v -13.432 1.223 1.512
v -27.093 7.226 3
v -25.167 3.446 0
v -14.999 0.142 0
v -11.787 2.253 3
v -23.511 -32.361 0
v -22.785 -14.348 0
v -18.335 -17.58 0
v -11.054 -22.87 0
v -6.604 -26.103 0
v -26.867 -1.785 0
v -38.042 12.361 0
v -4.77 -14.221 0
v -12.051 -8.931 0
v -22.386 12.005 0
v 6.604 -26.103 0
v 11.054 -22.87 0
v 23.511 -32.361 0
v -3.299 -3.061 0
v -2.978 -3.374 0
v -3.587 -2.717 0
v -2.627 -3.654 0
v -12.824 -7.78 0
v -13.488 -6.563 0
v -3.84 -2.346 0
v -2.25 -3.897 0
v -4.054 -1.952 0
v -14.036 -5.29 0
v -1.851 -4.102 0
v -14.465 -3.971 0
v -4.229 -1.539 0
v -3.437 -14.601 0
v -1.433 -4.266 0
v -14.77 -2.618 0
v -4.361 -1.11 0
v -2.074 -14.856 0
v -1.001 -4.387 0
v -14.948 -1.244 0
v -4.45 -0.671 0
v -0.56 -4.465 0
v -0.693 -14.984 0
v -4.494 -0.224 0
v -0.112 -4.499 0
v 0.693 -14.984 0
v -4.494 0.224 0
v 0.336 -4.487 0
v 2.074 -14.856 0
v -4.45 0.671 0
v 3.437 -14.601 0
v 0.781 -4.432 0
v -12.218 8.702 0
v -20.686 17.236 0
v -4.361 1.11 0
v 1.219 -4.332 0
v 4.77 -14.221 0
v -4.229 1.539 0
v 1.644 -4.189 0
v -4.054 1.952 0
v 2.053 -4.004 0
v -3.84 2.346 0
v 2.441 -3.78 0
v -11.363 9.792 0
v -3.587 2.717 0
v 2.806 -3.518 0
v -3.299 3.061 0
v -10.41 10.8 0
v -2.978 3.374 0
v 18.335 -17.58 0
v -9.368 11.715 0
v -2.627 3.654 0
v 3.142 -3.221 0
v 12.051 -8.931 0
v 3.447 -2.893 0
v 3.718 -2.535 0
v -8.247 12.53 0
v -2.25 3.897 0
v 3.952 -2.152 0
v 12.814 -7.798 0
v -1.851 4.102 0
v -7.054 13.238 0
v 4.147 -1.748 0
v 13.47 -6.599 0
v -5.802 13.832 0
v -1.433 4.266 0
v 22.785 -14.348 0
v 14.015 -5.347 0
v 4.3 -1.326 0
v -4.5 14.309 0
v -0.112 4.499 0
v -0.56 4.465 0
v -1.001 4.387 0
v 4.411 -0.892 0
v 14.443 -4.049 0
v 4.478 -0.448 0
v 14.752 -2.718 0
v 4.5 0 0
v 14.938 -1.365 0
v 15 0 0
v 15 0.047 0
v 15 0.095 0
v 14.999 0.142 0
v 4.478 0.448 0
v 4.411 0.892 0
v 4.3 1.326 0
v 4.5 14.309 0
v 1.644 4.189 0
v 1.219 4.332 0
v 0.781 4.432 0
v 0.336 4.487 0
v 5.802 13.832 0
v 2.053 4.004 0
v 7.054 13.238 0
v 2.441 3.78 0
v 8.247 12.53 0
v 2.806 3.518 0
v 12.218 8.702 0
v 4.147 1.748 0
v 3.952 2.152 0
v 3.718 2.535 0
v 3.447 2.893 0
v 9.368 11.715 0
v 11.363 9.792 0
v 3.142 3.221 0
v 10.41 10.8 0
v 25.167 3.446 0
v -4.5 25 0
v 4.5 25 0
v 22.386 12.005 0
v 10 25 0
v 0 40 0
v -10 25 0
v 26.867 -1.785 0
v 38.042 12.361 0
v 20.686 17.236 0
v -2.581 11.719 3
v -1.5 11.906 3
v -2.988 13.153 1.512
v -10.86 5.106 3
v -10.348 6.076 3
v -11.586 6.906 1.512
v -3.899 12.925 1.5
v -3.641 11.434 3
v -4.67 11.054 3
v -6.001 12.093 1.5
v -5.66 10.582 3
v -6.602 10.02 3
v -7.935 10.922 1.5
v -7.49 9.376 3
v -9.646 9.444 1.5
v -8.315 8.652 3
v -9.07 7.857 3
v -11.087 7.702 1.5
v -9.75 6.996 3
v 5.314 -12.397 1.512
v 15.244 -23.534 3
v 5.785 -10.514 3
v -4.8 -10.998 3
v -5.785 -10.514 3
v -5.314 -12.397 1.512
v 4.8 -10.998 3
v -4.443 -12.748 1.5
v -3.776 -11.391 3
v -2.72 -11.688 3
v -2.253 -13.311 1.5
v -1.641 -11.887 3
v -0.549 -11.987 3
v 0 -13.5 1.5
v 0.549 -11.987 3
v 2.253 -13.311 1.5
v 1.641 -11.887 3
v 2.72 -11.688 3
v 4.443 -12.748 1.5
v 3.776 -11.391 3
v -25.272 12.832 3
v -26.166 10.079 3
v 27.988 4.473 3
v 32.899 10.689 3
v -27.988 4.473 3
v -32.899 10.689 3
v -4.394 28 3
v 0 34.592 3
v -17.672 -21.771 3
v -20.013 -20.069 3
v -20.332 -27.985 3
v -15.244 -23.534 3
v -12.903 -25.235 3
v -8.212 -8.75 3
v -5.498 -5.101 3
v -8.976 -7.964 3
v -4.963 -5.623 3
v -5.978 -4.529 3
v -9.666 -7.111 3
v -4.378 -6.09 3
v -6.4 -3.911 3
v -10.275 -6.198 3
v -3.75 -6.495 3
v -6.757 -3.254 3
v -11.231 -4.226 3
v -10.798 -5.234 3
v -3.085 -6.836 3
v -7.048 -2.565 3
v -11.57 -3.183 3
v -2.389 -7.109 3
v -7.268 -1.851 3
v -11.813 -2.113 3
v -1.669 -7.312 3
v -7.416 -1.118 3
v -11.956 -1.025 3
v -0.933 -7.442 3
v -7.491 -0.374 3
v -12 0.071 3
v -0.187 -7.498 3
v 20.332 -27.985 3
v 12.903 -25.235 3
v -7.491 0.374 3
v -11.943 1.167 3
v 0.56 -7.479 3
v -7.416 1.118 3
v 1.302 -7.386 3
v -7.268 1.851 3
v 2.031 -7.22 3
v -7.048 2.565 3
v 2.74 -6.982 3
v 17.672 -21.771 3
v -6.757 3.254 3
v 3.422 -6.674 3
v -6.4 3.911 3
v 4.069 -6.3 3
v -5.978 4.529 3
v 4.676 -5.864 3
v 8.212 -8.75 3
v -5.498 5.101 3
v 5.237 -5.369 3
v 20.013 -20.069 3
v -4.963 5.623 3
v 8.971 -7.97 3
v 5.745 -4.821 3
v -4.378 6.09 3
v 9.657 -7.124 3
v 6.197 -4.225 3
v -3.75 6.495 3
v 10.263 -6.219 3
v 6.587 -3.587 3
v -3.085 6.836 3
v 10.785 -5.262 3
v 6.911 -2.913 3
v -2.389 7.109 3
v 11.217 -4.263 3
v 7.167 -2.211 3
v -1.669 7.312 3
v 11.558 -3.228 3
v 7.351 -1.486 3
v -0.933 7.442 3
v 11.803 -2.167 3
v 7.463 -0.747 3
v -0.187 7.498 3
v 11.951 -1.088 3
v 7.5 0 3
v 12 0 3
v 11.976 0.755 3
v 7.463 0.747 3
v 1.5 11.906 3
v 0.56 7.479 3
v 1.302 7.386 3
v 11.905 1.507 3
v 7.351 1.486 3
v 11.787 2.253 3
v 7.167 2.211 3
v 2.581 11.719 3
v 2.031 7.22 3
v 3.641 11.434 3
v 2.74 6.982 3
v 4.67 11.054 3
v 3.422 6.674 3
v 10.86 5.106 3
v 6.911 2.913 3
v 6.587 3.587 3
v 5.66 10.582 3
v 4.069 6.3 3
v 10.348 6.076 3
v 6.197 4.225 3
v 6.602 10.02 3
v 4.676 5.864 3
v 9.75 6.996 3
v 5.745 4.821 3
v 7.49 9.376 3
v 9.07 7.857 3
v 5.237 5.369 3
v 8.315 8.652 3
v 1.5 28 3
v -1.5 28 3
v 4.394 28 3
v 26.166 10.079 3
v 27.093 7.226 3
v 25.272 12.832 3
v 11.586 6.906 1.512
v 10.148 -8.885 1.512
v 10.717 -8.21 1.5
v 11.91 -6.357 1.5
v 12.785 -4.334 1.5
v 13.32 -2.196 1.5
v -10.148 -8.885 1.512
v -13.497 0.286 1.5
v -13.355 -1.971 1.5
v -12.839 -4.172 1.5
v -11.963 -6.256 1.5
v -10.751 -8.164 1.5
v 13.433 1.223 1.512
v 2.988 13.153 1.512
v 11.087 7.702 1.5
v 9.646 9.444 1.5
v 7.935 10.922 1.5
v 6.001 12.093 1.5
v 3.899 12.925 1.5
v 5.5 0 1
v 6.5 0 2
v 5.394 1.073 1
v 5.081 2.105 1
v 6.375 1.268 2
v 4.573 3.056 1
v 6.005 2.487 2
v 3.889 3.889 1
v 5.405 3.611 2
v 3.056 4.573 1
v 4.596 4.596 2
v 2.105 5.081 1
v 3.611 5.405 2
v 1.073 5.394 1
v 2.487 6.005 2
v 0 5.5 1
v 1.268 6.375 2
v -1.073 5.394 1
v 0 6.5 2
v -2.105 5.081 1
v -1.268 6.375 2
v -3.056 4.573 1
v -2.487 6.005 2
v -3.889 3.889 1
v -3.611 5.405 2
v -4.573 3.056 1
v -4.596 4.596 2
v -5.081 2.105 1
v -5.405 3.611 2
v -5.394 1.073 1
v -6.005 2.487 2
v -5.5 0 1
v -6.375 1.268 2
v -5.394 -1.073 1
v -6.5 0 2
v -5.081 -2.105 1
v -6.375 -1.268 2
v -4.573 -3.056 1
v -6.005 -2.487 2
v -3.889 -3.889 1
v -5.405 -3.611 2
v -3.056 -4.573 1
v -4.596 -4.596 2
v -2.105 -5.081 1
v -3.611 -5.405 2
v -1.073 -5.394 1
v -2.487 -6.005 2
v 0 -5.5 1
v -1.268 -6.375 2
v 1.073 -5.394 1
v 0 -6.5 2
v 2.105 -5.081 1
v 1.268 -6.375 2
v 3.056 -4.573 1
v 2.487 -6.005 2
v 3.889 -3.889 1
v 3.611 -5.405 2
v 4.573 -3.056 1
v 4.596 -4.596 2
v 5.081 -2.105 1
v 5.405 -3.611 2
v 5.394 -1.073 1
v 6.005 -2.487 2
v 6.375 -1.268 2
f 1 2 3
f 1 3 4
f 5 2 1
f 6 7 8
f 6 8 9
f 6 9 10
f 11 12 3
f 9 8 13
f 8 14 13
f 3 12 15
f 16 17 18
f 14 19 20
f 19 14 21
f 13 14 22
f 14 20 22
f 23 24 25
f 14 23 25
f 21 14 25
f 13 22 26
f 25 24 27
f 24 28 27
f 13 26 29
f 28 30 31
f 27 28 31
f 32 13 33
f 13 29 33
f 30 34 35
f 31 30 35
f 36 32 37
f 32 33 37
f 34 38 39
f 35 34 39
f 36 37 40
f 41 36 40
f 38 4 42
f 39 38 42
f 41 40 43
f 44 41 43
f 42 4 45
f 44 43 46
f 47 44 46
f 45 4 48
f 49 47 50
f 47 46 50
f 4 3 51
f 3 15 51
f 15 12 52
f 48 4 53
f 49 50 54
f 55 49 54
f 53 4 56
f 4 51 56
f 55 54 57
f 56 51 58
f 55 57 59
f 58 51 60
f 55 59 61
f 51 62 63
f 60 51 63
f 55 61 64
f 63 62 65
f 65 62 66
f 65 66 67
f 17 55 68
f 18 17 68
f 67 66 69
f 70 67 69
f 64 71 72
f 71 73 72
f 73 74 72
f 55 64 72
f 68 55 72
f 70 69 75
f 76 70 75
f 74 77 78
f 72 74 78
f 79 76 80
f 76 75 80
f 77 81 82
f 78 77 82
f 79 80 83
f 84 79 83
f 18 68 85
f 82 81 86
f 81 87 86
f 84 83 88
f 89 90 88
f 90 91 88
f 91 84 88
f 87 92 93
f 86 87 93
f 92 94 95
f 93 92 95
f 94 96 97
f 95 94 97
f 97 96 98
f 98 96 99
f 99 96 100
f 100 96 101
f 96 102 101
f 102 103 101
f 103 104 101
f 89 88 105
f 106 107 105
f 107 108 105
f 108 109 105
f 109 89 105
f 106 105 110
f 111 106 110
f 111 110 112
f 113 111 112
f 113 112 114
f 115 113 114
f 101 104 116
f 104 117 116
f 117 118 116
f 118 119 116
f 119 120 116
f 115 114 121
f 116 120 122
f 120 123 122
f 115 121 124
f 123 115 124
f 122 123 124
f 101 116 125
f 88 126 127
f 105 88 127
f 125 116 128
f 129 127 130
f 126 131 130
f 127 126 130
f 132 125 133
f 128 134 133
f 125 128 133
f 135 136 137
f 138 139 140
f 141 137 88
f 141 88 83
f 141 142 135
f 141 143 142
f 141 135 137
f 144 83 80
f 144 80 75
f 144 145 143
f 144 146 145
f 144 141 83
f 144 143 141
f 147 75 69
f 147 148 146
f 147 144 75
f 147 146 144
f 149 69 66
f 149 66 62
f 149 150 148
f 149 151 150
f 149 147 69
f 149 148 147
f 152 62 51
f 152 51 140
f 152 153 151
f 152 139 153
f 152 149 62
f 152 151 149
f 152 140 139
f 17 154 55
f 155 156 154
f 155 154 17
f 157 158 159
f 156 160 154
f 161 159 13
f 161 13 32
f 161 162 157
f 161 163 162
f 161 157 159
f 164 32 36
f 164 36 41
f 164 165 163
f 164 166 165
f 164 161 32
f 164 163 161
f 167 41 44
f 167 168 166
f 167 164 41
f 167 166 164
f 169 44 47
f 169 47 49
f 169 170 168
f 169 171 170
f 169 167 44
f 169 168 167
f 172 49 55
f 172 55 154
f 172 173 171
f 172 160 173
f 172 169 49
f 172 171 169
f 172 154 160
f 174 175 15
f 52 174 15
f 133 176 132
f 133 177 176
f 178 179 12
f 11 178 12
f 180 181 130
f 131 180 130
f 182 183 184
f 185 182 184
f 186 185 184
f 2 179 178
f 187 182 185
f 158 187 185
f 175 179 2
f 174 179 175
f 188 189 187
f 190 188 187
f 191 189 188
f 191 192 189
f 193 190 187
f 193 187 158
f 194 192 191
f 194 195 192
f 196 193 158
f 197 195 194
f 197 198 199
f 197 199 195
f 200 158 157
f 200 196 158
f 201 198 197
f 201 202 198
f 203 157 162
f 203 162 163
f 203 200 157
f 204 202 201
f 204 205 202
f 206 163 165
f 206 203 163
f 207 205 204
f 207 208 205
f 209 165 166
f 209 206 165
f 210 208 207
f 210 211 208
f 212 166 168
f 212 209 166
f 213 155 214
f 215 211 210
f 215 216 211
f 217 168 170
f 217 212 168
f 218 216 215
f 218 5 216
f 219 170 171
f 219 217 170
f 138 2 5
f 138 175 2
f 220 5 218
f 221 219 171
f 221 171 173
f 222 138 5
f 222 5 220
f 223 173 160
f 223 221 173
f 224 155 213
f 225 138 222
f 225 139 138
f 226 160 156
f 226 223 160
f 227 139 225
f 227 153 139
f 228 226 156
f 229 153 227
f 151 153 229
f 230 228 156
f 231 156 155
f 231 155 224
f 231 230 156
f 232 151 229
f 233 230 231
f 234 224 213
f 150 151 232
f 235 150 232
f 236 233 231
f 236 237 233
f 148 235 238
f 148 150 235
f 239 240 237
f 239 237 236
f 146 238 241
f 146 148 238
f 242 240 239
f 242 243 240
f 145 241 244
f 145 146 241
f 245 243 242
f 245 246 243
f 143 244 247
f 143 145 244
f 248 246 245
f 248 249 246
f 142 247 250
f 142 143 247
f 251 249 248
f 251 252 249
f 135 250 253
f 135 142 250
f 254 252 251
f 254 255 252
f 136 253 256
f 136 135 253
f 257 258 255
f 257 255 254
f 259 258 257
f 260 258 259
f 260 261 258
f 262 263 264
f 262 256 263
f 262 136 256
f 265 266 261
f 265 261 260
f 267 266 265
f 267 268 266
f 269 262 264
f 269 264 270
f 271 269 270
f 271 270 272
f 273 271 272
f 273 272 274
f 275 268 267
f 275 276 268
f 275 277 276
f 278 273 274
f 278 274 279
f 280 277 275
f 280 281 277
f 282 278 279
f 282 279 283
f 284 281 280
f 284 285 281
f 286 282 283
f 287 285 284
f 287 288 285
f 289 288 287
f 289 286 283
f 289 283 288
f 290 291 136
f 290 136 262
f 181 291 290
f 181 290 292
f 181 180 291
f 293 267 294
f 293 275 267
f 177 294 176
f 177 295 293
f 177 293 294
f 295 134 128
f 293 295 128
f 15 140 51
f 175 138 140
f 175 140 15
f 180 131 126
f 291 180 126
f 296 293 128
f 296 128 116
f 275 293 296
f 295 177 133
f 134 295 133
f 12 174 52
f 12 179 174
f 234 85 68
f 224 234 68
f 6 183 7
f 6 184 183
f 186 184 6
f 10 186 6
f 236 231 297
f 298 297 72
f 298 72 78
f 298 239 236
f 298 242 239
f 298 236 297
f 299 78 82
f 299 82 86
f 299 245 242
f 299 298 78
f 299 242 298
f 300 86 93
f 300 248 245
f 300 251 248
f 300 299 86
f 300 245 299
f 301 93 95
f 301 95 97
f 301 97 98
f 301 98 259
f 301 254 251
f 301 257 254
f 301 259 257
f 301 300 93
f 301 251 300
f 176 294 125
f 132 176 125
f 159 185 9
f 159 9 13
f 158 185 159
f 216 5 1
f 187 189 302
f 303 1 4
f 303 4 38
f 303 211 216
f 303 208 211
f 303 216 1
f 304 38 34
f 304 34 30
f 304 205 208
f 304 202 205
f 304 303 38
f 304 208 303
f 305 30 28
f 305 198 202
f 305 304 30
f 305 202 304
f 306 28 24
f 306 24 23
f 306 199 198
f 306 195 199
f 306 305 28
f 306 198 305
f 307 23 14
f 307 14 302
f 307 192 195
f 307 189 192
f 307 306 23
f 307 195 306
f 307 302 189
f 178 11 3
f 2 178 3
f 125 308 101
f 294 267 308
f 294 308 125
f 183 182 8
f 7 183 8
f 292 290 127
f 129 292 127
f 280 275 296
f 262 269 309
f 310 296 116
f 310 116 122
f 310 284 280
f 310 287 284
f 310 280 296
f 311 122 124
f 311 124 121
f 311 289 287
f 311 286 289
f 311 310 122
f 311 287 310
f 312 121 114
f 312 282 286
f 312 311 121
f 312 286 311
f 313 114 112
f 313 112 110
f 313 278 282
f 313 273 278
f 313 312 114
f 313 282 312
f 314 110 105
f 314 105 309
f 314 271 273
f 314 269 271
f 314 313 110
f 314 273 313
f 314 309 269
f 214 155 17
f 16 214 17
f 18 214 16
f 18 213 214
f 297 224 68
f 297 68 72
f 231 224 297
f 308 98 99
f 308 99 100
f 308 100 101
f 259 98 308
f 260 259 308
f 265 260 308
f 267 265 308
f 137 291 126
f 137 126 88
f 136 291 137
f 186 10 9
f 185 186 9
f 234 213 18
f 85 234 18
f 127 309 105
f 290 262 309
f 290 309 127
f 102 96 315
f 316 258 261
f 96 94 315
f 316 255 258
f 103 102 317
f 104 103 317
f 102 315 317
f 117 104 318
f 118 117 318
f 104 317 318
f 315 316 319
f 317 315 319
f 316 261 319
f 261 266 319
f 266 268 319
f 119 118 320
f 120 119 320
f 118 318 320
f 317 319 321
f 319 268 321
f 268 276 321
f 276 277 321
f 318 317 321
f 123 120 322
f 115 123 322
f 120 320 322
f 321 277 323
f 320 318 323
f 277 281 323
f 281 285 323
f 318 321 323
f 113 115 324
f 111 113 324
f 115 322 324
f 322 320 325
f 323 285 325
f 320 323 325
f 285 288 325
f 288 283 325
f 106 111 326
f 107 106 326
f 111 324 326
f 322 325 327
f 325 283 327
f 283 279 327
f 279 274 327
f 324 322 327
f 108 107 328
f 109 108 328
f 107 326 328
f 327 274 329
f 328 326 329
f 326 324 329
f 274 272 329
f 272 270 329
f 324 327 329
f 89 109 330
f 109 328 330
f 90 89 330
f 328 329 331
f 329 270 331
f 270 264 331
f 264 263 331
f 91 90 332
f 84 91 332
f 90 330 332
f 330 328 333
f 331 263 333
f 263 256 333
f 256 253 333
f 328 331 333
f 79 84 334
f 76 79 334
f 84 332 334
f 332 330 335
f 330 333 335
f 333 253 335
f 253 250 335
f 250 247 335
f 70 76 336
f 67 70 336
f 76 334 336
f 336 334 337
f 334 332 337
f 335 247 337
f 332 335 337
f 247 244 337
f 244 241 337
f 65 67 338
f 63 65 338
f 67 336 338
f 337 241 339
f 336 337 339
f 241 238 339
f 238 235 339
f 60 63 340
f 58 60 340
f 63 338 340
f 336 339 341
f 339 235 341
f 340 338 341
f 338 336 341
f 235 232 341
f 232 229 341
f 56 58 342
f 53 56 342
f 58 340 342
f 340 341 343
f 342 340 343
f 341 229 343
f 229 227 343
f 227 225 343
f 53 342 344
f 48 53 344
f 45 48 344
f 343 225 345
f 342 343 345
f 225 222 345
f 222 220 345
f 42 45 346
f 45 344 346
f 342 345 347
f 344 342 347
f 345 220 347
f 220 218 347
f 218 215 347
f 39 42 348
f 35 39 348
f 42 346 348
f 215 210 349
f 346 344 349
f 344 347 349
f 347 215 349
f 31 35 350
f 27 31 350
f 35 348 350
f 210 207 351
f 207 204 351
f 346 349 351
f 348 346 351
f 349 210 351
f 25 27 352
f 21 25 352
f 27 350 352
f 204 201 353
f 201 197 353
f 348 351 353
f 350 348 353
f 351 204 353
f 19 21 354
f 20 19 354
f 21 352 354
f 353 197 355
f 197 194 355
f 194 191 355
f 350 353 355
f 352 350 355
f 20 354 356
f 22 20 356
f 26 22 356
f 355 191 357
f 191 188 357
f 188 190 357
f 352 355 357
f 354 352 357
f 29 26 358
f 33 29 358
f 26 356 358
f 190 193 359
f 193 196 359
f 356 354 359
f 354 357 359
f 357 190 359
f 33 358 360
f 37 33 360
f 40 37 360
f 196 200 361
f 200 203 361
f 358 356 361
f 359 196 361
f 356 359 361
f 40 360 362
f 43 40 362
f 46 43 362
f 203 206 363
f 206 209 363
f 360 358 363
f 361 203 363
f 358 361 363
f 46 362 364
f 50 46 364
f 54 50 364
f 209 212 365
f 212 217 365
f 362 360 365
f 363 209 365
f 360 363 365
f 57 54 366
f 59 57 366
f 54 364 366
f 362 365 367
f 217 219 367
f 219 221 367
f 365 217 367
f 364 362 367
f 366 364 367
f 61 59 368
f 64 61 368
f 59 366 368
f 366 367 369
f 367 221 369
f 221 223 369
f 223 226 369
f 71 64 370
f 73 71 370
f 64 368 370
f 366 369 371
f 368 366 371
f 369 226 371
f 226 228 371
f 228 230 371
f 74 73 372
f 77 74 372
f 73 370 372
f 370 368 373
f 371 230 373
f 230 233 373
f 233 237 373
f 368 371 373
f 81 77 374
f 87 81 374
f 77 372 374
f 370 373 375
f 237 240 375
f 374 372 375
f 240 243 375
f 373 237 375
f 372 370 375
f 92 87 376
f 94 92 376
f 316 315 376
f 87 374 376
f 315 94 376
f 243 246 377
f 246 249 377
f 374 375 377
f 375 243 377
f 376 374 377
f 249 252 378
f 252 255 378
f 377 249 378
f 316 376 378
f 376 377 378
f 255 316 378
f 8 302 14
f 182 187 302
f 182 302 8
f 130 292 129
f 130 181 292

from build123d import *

# Parameters (mm, degrees)
F0_R     = 4.5
F1_DEPTH = 3
F2_SIZE2 = 2.99999
F2_SIZE  = 2.99999


# Not quite as in the source:
# - a fillet or chamfer is up to 0.001 mm smaller than in the source, because OpenCascade refuses the exact size


with BuildPart() as f1:
    # F0 (on Top) → F1 (new body)
    with BuildSketch(Plane.XY):
        with BuildLine():
            ThreePointArc((12.0512473873, -8.9312617479), (14.2437479409, -4.7027273571), (15, 0))
            ThreePointArc((15, 0), (14.9998319689, 0.07099932), (14.9993278795, 0.1419970492))
            Line((14.9993278795, 0.1419970492), (9.794719653, -1.5490826747))
            Line((9.794719653, -1.5490826747), (7.0135667036, 7.0104259719))
            Line((7.0135667036, 7.0104259719), (12.2181749302, 8.7015056959))
            ThreePointArc((12.2181749302, 8.7015056959), (8.8167787844, 12.1352549156), (4.5, 14.3090880213))
            Line((4.5, 14.3090880213), (4.5, 8.8366390791))
            Line((4.5, 8.8366390791), (-4.5, 8.8366390791))
            Line((-4.5, 8.8366390791), (-4.5, 14.3090880213))
            ThreePointArc((-4.5, 14.3090880213), (-8.8167787844, 12.1352549156), (-12.2181749302, 8.7015056959))
            Line((-12.2181749302, 8.7015056959), (-7.0135667036, 7.0104259719))
            Line((-7.0135667036, 7.0104259719), (-9.794719653, -1.5490826747))
            Line((-9.794719653, -1.5490826747), (-14.9993278795, 0.1419970492))
            ThreePointArc((-14.9993278795, 0.1419970492), (-14.2658477444, -4.6352549156), (-12.0512473873, -8.9312617479))
            Line((-12.0512473873, -8.9312617479), (-8.8346226052, -4.5039575528))
            Line((-8.8346226052, -4.5039575528), (-1.5534696558, -9.7940248235))
            Line((-1.5534696558, -9.7940248235), (-4.770094438, -14.2213290185))
            ThreePointArc((-4.770094438, -14.2213290185), (0, -15), (4.770094438, -14.2213290185))
            Line((4.770094438, -14.2213290185), (1.5534696558, -9.7940248235))
            Line((1.5534696558, -9.7940248235), (8.8346226052, -4.5039575528))
            Line((8.8346226052, -4.5039575528), (12.0512473873, -8.9312617479))
        make_face()
        Circle(F0_R, mode=Mode.SUBTRACT)
        with BuildLine():
            Line((9.794719653, -1.5490826747), (14.9993278795, 0.1419970492))
            ThreePointArc((14.9993278795, 0.1419970492), (14.2658477444, 4.6352549156), (12.2181749302, 8.7015056959))
            Line((12.2181749302, 8.7015056959), (7.0135667036, 7.0104259719))
            Line((7.0135667036, 7.0104259719), (9.794719653, -1.5490826747))
        make_face()
        with BuildLine():
            ThreePointArc((12.2181749302, 8.7015056959), (14.2658477444, 4.6352549156), (14.9993278795, 0.1419970492))
            Line((14.9993278795, 0.1419970492), (25.1669893821, 3.445670536))
            Line((25.1669893821, 3.445670536), (22.3858364327, 12.0051791827))
            Line((22.3858364327, 12.0051791827), (12.2181749302, 8.7015056959))
        make_face()
        with BuildLine():
            Line((18.335207782, -17.5803912241), (12.0512473873, -8.9312617479))
            ThreePointArc((12.0512473873, -8.9312617479), (8.8167787844, -12.1352549156), (4.770094438, -14.2213290185))
            Line((4.770094438, -14.2213290185), (11.0540548326, -22.8704584947))
            Line((11.0540548326, -22.8704584947), (18.335207782, -17.5803912241))
        make_face()
        with BuildLine():
            ThreePointArc((4.770094438, -14.2213290185), (8.8167787844, -12.1352549156), (12.0512473873, -8.9312617479))
            Line((12.0512473873, -8.9312617479), (8.8346226052, -4.5039575528))
            Line((8.8346226052, -4.5039575528), (1.5534696558, -9.7940248235))
            Line((1.5534696558, -9.7940248235), (4.770094438, -14.2213290185))
        make_face()
        Polygon((22.3858364327, 12.0051791827), (25.1669893821, 3.445670536), (26.8665828511, -1.7851403036), (38.0422606518, 12.360679775), (20.6862429636, 17.2359900223), align=None)
        Polygon((22.7848012511, -14.3475723364), (18.335207782, -17.5803912241), (11.0540548326, -22.8704584947), (6.6044613636, -26.1032773823), (23.5114100917, -32.360679775), align=None)
        with BuildLine():
            Line((4.5, 8.8366390791), (4.5, 14.3090880213))
            ThreePointArc((4.5, 14.3090880213), (0, 15), (-4.5, 14.3090880213))
            Line((-4.5, 14.3090880213), (-4.5, 8.8366390791))
            Line((-4.5, 8.8366390791), (4.5, 8.8366390791))
        make_face()
        with BuildLine():
            ThreePointArc((-4.5, 14.3090880213), (0, 15), (4.5, 14.3090880213))
            Line((4.5, 14.3090880213), (4.5, 25))
            Line((4.5, 25), (-4.5, 25))
            Line((-4.5, 25), (-4.5, 14.3090880213))
        make_face()
        with BuildLine():
            Line((-11.0540548326, -22.8704584947), (-4.770094438, -14.2213290185))
            ThreePointArc((-4.770094438, -14.2213290185), (-8.8167787844, -12.1352549156), (-12.0512473873, -8.9312617479))
            Line((-12.0512473873, -8.9312617479), (-18.335207782, -17.5803912241))
            Line((-18.335207782, -17.5803912241), (-11.0540548326, -22.8704584947))
        make_face()
        with BuildLine():
            ThreePointArc((-12.0512473873, -8.9312617479), (-8.8167787844, -12.1352549156), (-4.770094438, -14.2213290185))
            Line((-4.770094438, -14.2213290185), (-1.5534696558, -9.7940248235))
            Line((-1.5534696558, -9.7940248235), (-8.8346226052, -4.5039575528))
            Line((-8.8346226052, -4.5039575528), (-12.0512473873, -8.9312617479))
        make_face()
        Polygon((-4.5, 25), (4.5, 25), (10, 25), (0, 40), (-10, 25), align=None)
        Polygon((-6.6044613636, -26.1032773823), (-11.0540548326, -22.8704584947), (-18.335207782, -17.5803912241), (-22.7848012511, -14.3475723364), (-23.5114100917, -32.360679775), align=None)
        with BuildLine():
            Line((-7.0135667036, 7.0104259719), (-12.2181749302, 8.7015056959))
            ThreePointArc((-12.2181749302, 8.7015056959), (-14.2658477444, 4.6352549156), (-14.9993278795, 0.1419970492))
            Line((-14.9993278795, 0.1419970492), (-9.794719653, -1.5490826747))
            Line((-9.794719653, -1.5490826747), (-7.0135667036, 7.0104259719))
        make_face()
        with BuildLine():
            ThreePointArc((-14.9993278795, 0.1419970492), (-14.2658477444, 4.6352549156), (-12.2181749302, 8.7015056959))
            Line((-12.2181749302, 8.7015056959), (-22.3858364327, 12.0051791827))
            Line((-22.3858364327, 12.0051791827), (-25.1669893821, 3.445670536))
            Line((-25.1669893821, 3.445670536), (-14.9993278795, 0.1419970492))
        make_face()
        Polygon((-25.1669893821, 3.445670536), (-22.3858364327, 12.0051791827), (-20.6862429636, 17.2359900223), (-38.0422606518, 12.360679775), (-26.8665828511, -1.7851403036), align=None)
    extrude(amount=F1_DEPTH)

    # F2 (size 3 and 3 in the source; OpenCascade refuses exactly that, so slightly less here)
    f2_edges = [f1.edges().sort_by_distance(p)[0] for p in [
        (-15.193228, -13.255826, 3),
        (-20.560005, -15.963982, 3),
        (-23.148106, -23.354126, 3),
        (-15.057936, -29.231979, 3),
        (-8.829258, -24.486868, 3),
        (-7.912075, -18.545894, 3),
        (0, -15, 3),
        (7.912075, -18.545894, 3),
        (8.829258, -24.486868, 3),
        (15.057936, -29.231979, 3),
        (23.148106, -23.354126, 3),
        (20.560005, -15.963982, 3),
        (15.193228, -13.255826, 3),
        (14.265848, -4.635255, 3),
        (20.083159, 1.793834, 3),
        (26.016786, 0.830265, 3),
        (32.454422, 5.28777, 3),
        (29.364252, 14.798335, 3),
        (21.53604, 14.620585, 3),
        (17.302006, 10.353342, 3),
        (8.816779, 12.135255, 3),
        (4.5, 19.654544, 3),
        (7.25, 25, 3),
        (5, 32.5, 3),
        (-5, 32.5, 3),
        (-7.25, 25, 3),
        (-4.5, 19.654544, 3),
        (-8.816779, 12.135255, 3),
        (-17.302006, 10.353342, 3),
        (-21.53604, 14.620585, 3),
        (-29.364252, 14.798335, 3),
        (-32.454422, 5.28777, 3),
        (-26.016786, 0.830265, 3),
        (-20.083159, 1.793834, 3),
        (-14.265848, -4.635255, 3),
        (-4.5, 0, 3),
    ]]
    chamfer(f2_edges, length=F2_SIZE, length2=F2_SIZE2)


solid = f1.part
